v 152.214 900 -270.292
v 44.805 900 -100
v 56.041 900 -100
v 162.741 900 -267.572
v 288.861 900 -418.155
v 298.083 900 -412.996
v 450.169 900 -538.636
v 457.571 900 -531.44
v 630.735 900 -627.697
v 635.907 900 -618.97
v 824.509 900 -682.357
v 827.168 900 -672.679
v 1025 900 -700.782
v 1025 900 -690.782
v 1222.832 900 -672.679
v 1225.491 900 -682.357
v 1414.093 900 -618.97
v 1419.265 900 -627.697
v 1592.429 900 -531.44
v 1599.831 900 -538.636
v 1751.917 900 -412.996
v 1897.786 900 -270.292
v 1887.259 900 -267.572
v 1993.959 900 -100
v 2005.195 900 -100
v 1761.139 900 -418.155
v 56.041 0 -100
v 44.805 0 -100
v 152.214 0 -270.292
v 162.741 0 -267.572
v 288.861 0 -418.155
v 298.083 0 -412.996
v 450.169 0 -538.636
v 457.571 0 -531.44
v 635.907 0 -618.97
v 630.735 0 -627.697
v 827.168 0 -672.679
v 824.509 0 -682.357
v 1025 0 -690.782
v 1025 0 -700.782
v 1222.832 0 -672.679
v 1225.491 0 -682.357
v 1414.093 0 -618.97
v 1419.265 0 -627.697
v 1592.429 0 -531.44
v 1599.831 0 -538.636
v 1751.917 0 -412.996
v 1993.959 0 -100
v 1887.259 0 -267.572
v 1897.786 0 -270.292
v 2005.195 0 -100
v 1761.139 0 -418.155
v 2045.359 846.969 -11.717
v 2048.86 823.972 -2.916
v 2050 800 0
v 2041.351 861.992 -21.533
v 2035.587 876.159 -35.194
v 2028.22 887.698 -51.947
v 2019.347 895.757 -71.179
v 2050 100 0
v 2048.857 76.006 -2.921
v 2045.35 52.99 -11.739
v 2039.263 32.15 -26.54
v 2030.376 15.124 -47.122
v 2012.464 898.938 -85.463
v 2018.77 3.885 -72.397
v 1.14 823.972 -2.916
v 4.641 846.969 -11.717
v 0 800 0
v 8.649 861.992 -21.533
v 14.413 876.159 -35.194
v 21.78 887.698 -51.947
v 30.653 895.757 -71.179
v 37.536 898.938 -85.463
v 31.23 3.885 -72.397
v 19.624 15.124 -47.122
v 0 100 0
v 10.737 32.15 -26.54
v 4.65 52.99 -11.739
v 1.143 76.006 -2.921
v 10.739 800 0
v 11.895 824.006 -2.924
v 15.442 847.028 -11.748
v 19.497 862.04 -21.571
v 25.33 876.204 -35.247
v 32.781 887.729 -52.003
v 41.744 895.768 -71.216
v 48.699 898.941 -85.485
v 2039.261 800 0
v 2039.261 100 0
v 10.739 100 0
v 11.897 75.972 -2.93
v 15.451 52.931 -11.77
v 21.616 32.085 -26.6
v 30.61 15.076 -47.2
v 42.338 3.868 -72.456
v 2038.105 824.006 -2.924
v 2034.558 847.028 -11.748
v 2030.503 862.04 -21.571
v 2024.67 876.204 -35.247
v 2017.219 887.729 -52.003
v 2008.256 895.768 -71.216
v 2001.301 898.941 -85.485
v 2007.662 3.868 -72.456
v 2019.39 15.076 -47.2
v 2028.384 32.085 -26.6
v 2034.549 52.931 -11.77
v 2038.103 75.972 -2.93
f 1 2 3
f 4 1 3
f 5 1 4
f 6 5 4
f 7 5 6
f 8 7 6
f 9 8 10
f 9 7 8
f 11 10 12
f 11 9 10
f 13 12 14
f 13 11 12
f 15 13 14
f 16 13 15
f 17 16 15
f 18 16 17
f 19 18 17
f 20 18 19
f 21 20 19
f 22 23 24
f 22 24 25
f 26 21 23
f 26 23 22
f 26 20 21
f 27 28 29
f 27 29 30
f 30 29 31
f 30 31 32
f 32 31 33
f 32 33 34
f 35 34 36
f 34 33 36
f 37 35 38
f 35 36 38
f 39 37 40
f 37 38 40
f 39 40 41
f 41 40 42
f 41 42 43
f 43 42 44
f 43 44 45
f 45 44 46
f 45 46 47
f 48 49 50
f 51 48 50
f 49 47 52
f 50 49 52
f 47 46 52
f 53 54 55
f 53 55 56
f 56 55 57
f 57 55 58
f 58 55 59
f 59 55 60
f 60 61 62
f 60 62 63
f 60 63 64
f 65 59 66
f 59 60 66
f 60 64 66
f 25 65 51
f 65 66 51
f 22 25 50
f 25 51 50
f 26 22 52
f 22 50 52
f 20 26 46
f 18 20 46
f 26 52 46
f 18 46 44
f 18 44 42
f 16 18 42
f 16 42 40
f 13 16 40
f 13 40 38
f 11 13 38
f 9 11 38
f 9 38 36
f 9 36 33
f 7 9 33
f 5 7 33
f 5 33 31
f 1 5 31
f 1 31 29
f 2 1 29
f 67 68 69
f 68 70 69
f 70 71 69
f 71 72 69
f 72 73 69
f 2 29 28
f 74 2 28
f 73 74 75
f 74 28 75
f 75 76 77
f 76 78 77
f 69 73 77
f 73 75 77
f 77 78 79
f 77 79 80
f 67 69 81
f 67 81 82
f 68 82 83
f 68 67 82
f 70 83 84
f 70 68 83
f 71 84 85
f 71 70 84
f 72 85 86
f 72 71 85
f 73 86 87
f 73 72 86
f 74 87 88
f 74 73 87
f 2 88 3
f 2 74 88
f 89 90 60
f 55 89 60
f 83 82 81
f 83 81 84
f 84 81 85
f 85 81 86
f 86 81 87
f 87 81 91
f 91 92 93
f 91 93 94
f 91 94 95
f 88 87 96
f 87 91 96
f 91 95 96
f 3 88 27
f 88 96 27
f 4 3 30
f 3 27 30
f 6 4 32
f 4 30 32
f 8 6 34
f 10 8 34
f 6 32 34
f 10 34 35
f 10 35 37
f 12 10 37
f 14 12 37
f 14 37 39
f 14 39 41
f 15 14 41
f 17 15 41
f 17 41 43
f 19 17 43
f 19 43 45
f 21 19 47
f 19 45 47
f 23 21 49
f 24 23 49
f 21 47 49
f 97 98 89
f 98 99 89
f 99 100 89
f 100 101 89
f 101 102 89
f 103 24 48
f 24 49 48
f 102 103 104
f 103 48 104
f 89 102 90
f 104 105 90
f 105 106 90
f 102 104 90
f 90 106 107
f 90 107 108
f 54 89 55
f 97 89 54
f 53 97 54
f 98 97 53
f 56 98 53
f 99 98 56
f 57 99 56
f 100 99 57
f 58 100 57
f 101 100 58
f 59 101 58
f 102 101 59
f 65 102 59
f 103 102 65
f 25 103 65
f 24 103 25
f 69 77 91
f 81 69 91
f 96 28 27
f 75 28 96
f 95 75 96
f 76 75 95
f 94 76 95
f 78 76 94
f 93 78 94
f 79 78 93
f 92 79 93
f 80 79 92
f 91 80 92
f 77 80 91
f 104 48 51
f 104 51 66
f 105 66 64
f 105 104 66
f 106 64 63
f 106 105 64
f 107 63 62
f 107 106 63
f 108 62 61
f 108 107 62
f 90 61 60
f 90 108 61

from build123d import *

# Parameters (mm, degrees)
BOSS_EXTRUDE1_DEPTH = 900
FILLET1_START       = -1
FILLET1_DEPTH       = 2052


with BuildPart() as part:
    # Sketch1 → Boss-Extrude1 (new body)
    with BuildSketch(Plane(origin=(0, 0, 0), x_dir=(1, 0, 0), z_dir=(0, 1, 0))):
        with BuildLine():
            Line((0, 0), (10.739185416, 0))
            ThreePointArc((10.739185416, 0), (1025, 690.782014433), (2039.260814584, 0))
            Line((2039.260814584, 0), (2050, 0))
            ThreePointArc((2050, 0), (1025, 700.782014433), (0, 0))
        make_face()
    extrude(amount=BOSS_EXTRUDE1_DEPTH)

    # Fillet1: read off the stored shape, not the designer's step
    # Fillet1 outline → Fillet1 (cut)
    with BuildSketch(Plane.YZ.offset(FILLET1_START)):
        with BuildLine():
            ThreePointArc((0, -100), (29.289321881, -29.289321881), (100, 0))
            Line((100, 0), (0, 0))
            Line((0, 0), (0, -100))
        make_face()
        with BuildLine():
            ThreePointArc((800, 0), (870.710678119, -29.289321881), (900, -100))
            Line((900, -100), (900, 0))
            Line((900, 0), (800, 0))
        make_face()
    extrude(amount=FILLET1_DEPTH, mode=Mode.SUBTRACT)


solid = part.part
